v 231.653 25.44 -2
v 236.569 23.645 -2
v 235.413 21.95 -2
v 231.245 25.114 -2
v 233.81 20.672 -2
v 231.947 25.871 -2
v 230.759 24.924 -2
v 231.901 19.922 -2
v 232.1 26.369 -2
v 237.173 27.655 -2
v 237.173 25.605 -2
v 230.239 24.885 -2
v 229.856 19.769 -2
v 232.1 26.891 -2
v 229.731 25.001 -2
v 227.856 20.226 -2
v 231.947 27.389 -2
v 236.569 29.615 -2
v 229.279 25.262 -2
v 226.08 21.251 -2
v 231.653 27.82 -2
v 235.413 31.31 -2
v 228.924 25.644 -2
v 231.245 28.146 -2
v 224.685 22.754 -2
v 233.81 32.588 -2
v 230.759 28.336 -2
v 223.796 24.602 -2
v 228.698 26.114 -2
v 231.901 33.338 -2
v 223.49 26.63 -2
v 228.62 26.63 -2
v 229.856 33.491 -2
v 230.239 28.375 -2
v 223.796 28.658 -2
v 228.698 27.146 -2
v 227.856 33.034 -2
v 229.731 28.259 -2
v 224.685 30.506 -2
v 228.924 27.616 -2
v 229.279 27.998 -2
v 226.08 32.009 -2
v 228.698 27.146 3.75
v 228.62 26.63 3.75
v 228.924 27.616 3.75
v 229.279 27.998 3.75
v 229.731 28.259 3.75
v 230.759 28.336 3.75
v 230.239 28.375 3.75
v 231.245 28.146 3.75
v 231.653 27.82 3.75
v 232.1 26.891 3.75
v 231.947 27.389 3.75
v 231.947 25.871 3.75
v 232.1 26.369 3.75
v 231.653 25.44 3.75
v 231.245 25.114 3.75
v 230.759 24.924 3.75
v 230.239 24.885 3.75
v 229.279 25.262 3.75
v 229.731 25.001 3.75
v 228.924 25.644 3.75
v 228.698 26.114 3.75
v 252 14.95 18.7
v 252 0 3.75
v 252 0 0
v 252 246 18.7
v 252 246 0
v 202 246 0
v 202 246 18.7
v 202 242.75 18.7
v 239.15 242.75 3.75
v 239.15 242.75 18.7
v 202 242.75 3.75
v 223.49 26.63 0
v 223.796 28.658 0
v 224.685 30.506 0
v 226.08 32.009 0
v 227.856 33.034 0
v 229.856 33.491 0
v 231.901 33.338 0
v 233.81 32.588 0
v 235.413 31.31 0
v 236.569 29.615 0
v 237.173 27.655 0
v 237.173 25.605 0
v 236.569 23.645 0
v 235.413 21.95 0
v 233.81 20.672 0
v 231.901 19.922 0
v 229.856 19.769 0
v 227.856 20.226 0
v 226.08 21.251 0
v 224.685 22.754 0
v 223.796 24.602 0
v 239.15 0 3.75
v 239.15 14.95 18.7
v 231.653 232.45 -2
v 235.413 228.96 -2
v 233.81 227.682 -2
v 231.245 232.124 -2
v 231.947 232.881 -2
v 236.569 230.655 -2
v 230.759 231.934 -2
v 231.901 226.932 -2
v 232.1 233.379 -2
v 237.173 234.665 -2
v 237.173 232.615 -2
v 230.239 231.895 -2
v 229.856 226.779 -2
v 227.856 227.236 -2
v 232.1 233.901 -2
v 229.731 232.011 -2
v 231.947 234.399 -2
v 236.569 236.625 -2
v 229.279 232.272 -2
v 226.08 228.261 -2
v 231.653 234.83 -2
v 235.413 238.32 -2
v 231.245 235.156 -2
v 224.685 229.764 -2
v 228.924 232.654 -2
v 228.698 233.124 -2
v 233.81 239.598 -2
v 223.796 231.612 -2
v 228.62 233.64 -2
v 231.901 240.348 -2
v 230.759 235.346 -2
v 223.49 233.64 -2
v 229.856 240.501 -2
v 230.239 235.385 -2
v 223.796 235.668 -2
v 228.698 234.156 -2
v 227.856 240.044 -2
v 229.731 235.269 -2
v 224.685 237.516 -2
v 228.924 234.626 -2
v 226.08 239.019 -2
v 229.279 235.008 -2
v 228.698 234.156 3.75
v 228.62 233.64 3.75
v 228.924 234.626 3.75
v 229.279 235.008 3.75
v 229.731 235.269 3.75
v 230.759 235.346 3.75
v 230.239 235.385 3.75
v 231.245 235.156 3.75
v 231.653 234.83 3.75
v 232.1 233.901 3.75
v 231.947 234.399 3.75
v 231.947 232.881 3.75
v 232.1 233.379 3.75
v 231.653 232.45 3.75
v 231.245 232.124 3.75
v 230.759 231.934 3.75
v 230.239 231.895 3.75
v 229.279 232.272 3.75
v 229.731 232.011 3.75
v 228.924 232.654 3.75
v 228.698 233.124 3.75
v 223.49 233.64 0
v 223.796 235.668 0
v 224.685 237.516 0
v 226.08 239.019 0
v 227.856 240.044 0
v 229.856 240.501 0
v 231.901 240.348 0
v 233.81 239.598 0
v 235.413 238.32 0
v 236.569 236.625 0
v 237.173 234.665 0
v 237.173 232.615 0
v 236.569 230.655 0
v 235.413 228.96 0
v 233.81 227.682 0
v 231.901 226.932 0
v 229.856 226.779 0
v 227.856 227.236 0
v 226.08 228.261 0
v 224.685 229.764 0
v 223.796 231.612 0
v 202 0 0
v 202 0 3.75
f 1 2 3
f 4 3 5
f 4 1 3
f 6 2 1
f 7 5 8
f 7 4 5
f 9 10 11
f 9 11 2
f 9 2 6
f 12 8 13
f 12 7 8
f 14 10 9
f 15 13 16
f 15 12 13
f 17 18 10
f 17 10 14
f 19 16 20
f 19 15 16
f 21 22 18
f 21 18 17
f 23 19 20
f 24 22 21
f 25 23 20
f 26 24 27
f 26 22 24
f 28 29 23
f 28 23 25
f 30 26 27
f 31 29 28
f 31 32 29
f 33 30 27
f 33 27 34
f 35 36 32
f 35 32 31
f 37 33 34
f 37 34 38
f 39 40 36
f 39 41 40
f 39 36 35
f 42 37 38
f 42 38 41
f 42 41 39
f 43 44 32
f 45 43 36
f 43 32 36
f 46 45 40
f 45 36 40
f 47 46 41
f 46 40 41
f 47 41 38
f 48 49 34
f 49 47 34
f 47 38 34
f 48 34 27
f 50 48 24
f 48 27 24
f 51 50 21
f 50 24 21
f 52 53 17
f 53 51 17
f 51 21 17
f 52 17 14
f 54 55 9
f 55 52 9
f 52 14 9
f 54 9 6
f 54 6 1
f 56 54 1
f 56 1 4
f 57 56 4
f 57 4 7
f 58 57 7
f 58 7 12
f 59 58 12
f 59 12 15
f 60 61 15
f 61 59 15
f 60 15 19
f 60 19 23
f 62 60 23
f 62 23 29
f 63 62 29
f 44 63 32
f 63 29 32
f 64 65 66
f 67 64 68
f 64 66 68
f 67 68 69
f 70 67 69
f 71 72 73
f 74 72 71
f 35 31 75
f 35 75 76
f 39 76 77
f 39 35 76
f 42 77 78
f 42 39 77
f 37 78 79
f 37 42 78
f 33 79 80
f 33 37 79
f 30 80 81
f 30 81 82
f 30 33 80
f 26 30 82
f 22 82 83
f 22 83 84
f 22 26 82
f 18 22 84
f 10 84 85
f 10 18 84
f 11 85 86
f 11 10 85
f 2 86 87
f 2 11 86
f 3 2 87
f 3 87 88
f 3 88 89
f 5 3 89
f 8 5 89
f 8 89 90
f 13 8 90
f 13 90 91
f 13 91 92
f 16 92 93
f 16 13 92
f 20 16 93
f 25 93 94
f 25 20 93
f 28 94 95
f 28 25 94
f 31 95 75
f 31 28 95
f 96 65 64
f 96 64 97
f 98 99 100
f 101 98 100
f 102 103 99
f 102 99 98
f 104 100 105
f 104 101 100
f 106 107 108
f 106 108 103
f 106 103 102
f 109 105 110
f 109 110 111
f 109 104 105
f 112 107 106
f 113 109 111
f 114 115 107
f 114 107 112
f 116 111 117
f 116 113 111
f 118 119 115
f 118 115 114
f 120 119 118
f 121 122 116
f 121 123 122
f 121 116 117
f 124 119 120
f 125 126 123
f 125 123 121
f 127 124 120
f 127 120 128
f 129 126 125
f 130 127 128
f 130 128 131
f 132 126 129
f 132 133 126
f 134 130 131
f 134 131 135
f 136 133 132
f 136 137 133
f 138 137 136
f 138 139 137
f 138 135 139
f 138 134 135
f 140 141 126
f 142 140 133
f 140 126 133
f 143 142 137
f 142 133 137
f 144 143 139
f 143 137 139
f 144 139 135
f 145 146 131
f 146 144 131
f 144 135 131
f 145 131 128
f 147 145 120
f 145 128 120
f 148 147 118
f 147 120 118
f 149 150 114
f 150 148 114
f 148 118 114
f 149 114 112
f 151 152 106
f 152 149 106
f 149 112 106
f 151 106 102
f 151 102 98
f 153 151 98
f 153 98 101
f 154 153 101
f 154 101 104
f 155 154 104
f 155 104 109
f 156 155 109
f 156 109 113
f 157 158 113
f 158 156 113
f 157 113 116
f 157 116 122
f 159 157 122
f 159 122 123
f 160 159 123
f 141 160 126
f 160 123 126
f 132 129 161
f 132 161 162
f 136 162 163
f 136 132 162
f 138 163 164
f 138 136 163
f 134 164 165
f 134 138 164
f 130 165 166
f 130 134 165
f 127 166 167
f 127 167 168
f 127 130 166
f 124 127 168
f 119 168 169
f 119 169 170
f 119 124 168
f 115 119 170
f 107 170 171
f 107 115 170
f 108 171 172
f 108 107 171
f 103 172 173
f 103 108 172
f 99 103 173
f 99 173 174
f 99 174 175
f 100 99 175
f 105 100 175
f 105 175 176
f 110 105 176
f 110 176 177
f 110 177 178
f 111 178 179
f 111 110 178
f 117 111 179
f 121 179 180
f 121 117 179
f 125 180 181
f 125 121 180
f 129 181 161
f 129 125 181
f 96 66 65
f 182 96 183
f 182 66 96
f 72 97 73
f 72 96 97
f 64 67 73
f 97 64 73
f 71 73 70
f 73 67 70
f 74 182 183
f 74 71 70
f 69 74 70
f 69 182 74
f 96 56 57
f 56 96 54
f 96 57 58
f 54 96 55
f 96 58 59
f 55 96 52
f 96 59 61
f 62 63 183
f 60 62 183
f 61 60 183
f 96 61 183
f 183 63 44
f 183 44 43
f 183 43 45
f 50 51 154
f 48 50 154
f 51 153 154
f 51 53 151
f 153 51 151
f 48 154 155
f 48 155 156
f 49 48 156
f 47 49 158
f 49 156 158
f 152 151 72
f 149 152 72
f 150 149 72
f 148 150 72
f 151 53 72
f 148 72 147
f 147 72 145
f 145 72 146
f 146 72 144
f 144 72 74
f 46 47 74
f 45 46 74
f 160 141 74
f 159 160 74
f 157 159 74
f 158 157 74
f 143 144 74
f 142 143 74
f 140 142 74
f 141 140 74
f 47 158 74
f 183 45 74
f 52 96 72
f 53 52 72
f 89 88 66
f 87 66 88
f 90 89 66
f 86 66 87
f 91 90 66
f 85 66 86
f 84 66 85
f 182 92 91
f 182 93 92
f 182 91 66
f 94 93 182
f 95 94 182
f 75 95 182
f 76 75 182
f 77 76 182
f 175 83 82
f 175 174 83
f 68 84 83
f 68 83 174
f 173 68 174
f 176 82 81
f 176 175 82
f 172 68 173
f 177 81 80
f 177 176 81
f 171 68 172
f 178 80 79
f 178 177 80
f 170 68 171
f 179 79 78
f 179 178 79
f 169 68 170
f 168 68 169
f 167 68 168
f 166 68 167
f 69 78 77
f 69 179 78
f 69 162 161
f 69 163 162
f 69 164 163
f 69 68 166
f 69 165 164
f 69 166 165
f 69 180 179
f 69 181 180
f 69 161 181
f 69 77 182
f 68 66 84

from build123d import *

# Parameters (mm, degrees)
CYLINDER012029001058_R       = 1.75
CYLINDER012029001058_DEPTH   = 6
CYLINDER012029001059_R       = 6.88
CYLINDER012029001059_DEPTH   = 2
CYLINDER012029001060_R       = 1.75
CYLINDER012029001060_DEPTH   = 6
BOX015001051_W               = 20
BOX015001051_H               = 20
BOX015001051_DEPTH           = 28
BOX015001051_PLACEMENT_ANGLE = 45
BOX015001050_W               = 37.15
BOX015001050_H               = 242.75
BOX015001050_DEPTH           = 14.95
BOX015001048_W               = 50
BOX015001048_H               = 246
BOX015001048_DEPTH           = 14.95
BOX015001049_W               = 50
BOX015001049_H               = 246
BOX015001049_DEPTH           = 3.75
CYLINDER012029001061_R       = 6.88
CYLINDER012029001061_DEPTH   = 2


with BuildPart() as cylinder012029001058:
    # Cylinder012029001058 → Cylinder012029001058 (new body)
    with BuildSketch(Plane(origin=(21.63, 233.64, -2), x_dir=(1, 0, 0), z_dir=(0, 0, 1))):
        Circle(CYLINDER012029001058_R)
    extrude(amount=CYLINDER012029001058_DEPTH)


with BuildPart() as cylinder012029001059:
    # Cylinder012029001059 → Cylinder012029001059 (new body)
    with BuildSketch(Plane(origin=(21.63, 233.64, -2), x_dir=(1, 0, 0), z_dir=(0, 0, 1))):
        Circle(CYLINDER012029001059_R)
    extrude(amount=CYLINDER012029001059_DEPTH)


with BuildPart() as cylinder012029001060:
    # Cylinder012029001060 → Cylinder012029001060 (new body)
    with BuildSketch(Plane(origin=(21.63, 26.63, -2), x_dir=(1, 0, 0), z_dir=(0, 0, 1))):
        Circle(CYLINDER012029001060_R)
    extrude(amount=CYLINDER012029001060_DEPTH)


with BuildPart() as cube045:
    # Box015001051 → Box015001051 (new body)
    with BuildSketch(Plane.XY):
        with Locations((10, 10)):
            Rectangle(BOX015001051_W, BOX015001051_H)
    extrude(amount=BOX015001051_DEPTH)


with BuildPart() as cube045_1:
    # Box015001051 placement: moved
    add(cube045.part.moved(Location((0, -14.1422, 17.8921))).rotate(Axis((0, -14.1422, 17.8921), (-1, 0, 0)), BOX015001051_PLACEMENT_ANGLE))


with BuildPart() as cube003:
    # Box015001050 → Box015001050 (new body)
    with BuildSketch(Plane(origin=(12.85, 0, 3.75), x_dir=(1, 0, 0), z_dir=(0, 0, 1))):
        with Locations((18.575, 121.375)):
            Rectangle(BOX015001050_W, BOX015001050_H)
    extrude(amount=BOX015001050_DEPTH)


with BuildPart() as cut003053:
    # Box015001048 → Box015001048 (new body)
    with BuildSketch(Plane.XY.offset(3.75)):
        with Locations((25, 123)):
            Rectangle(BOX015001048_W, BOX015001048_H)
    extrude(amount=BOX015001048_DEPTH)

    # Cut003052: cut Cube003
    add(cube003.part, mode=Mode.SUBTRACT)

    # Cut003053: cut Cube045
    add(cube045_1.part, mode=Mode.SUBTRACT)


with BuildPart() as fusion001019007005:
    # Box015001049 → Box015001049 (new body)
    with BuildSketch(Plane.XY):
        with Locations((25, 123)):
            Rectangle(BOX015001049_W, BOX015001049_H)
    extrude(amount=BOX015001049_DEPTH)

    # Fusion001019007005: union Cut003053
    add(cut003053.part)


with BuildPart() as cut003:
    # Cylinder012029001061 → Cylinder012029001061 (new body)
    with BuildSketch(Plane(origin=(21.63, 26.63, -2), x_dir=(1, 0, 0), z_dir=(0, 0, 1))):
        Circle(CYLINDER012029001061_R)
    extrude(amount=CYLINDER012029001061_DEPTH)

    # Fusion001019007004: union Fusion001019007005
    add(fusion001019007005.part)

    # Cut003054: cut Cylinder012029001060
    add(cylinder012029001060.part, mode=Mode.SUBTRACT)

    # Fusion001019007003: union Cylinder012029001059
    add(cylinder012029001059.part)

    # Cut003: cut Cylinder012029001058
    add(cylinder012029001058.part, mode=Mode.SUBTRACT)


with BuildPart() as part_mirroring:
    # Part__Mirroring: instance of Cut003
    add(cut003.part.mirror(Plane(origin=(126, 0, 0), x_dir=(0, -1, 0), z_dir=(1, 0, 0))))


solid = part_mirroring.part
